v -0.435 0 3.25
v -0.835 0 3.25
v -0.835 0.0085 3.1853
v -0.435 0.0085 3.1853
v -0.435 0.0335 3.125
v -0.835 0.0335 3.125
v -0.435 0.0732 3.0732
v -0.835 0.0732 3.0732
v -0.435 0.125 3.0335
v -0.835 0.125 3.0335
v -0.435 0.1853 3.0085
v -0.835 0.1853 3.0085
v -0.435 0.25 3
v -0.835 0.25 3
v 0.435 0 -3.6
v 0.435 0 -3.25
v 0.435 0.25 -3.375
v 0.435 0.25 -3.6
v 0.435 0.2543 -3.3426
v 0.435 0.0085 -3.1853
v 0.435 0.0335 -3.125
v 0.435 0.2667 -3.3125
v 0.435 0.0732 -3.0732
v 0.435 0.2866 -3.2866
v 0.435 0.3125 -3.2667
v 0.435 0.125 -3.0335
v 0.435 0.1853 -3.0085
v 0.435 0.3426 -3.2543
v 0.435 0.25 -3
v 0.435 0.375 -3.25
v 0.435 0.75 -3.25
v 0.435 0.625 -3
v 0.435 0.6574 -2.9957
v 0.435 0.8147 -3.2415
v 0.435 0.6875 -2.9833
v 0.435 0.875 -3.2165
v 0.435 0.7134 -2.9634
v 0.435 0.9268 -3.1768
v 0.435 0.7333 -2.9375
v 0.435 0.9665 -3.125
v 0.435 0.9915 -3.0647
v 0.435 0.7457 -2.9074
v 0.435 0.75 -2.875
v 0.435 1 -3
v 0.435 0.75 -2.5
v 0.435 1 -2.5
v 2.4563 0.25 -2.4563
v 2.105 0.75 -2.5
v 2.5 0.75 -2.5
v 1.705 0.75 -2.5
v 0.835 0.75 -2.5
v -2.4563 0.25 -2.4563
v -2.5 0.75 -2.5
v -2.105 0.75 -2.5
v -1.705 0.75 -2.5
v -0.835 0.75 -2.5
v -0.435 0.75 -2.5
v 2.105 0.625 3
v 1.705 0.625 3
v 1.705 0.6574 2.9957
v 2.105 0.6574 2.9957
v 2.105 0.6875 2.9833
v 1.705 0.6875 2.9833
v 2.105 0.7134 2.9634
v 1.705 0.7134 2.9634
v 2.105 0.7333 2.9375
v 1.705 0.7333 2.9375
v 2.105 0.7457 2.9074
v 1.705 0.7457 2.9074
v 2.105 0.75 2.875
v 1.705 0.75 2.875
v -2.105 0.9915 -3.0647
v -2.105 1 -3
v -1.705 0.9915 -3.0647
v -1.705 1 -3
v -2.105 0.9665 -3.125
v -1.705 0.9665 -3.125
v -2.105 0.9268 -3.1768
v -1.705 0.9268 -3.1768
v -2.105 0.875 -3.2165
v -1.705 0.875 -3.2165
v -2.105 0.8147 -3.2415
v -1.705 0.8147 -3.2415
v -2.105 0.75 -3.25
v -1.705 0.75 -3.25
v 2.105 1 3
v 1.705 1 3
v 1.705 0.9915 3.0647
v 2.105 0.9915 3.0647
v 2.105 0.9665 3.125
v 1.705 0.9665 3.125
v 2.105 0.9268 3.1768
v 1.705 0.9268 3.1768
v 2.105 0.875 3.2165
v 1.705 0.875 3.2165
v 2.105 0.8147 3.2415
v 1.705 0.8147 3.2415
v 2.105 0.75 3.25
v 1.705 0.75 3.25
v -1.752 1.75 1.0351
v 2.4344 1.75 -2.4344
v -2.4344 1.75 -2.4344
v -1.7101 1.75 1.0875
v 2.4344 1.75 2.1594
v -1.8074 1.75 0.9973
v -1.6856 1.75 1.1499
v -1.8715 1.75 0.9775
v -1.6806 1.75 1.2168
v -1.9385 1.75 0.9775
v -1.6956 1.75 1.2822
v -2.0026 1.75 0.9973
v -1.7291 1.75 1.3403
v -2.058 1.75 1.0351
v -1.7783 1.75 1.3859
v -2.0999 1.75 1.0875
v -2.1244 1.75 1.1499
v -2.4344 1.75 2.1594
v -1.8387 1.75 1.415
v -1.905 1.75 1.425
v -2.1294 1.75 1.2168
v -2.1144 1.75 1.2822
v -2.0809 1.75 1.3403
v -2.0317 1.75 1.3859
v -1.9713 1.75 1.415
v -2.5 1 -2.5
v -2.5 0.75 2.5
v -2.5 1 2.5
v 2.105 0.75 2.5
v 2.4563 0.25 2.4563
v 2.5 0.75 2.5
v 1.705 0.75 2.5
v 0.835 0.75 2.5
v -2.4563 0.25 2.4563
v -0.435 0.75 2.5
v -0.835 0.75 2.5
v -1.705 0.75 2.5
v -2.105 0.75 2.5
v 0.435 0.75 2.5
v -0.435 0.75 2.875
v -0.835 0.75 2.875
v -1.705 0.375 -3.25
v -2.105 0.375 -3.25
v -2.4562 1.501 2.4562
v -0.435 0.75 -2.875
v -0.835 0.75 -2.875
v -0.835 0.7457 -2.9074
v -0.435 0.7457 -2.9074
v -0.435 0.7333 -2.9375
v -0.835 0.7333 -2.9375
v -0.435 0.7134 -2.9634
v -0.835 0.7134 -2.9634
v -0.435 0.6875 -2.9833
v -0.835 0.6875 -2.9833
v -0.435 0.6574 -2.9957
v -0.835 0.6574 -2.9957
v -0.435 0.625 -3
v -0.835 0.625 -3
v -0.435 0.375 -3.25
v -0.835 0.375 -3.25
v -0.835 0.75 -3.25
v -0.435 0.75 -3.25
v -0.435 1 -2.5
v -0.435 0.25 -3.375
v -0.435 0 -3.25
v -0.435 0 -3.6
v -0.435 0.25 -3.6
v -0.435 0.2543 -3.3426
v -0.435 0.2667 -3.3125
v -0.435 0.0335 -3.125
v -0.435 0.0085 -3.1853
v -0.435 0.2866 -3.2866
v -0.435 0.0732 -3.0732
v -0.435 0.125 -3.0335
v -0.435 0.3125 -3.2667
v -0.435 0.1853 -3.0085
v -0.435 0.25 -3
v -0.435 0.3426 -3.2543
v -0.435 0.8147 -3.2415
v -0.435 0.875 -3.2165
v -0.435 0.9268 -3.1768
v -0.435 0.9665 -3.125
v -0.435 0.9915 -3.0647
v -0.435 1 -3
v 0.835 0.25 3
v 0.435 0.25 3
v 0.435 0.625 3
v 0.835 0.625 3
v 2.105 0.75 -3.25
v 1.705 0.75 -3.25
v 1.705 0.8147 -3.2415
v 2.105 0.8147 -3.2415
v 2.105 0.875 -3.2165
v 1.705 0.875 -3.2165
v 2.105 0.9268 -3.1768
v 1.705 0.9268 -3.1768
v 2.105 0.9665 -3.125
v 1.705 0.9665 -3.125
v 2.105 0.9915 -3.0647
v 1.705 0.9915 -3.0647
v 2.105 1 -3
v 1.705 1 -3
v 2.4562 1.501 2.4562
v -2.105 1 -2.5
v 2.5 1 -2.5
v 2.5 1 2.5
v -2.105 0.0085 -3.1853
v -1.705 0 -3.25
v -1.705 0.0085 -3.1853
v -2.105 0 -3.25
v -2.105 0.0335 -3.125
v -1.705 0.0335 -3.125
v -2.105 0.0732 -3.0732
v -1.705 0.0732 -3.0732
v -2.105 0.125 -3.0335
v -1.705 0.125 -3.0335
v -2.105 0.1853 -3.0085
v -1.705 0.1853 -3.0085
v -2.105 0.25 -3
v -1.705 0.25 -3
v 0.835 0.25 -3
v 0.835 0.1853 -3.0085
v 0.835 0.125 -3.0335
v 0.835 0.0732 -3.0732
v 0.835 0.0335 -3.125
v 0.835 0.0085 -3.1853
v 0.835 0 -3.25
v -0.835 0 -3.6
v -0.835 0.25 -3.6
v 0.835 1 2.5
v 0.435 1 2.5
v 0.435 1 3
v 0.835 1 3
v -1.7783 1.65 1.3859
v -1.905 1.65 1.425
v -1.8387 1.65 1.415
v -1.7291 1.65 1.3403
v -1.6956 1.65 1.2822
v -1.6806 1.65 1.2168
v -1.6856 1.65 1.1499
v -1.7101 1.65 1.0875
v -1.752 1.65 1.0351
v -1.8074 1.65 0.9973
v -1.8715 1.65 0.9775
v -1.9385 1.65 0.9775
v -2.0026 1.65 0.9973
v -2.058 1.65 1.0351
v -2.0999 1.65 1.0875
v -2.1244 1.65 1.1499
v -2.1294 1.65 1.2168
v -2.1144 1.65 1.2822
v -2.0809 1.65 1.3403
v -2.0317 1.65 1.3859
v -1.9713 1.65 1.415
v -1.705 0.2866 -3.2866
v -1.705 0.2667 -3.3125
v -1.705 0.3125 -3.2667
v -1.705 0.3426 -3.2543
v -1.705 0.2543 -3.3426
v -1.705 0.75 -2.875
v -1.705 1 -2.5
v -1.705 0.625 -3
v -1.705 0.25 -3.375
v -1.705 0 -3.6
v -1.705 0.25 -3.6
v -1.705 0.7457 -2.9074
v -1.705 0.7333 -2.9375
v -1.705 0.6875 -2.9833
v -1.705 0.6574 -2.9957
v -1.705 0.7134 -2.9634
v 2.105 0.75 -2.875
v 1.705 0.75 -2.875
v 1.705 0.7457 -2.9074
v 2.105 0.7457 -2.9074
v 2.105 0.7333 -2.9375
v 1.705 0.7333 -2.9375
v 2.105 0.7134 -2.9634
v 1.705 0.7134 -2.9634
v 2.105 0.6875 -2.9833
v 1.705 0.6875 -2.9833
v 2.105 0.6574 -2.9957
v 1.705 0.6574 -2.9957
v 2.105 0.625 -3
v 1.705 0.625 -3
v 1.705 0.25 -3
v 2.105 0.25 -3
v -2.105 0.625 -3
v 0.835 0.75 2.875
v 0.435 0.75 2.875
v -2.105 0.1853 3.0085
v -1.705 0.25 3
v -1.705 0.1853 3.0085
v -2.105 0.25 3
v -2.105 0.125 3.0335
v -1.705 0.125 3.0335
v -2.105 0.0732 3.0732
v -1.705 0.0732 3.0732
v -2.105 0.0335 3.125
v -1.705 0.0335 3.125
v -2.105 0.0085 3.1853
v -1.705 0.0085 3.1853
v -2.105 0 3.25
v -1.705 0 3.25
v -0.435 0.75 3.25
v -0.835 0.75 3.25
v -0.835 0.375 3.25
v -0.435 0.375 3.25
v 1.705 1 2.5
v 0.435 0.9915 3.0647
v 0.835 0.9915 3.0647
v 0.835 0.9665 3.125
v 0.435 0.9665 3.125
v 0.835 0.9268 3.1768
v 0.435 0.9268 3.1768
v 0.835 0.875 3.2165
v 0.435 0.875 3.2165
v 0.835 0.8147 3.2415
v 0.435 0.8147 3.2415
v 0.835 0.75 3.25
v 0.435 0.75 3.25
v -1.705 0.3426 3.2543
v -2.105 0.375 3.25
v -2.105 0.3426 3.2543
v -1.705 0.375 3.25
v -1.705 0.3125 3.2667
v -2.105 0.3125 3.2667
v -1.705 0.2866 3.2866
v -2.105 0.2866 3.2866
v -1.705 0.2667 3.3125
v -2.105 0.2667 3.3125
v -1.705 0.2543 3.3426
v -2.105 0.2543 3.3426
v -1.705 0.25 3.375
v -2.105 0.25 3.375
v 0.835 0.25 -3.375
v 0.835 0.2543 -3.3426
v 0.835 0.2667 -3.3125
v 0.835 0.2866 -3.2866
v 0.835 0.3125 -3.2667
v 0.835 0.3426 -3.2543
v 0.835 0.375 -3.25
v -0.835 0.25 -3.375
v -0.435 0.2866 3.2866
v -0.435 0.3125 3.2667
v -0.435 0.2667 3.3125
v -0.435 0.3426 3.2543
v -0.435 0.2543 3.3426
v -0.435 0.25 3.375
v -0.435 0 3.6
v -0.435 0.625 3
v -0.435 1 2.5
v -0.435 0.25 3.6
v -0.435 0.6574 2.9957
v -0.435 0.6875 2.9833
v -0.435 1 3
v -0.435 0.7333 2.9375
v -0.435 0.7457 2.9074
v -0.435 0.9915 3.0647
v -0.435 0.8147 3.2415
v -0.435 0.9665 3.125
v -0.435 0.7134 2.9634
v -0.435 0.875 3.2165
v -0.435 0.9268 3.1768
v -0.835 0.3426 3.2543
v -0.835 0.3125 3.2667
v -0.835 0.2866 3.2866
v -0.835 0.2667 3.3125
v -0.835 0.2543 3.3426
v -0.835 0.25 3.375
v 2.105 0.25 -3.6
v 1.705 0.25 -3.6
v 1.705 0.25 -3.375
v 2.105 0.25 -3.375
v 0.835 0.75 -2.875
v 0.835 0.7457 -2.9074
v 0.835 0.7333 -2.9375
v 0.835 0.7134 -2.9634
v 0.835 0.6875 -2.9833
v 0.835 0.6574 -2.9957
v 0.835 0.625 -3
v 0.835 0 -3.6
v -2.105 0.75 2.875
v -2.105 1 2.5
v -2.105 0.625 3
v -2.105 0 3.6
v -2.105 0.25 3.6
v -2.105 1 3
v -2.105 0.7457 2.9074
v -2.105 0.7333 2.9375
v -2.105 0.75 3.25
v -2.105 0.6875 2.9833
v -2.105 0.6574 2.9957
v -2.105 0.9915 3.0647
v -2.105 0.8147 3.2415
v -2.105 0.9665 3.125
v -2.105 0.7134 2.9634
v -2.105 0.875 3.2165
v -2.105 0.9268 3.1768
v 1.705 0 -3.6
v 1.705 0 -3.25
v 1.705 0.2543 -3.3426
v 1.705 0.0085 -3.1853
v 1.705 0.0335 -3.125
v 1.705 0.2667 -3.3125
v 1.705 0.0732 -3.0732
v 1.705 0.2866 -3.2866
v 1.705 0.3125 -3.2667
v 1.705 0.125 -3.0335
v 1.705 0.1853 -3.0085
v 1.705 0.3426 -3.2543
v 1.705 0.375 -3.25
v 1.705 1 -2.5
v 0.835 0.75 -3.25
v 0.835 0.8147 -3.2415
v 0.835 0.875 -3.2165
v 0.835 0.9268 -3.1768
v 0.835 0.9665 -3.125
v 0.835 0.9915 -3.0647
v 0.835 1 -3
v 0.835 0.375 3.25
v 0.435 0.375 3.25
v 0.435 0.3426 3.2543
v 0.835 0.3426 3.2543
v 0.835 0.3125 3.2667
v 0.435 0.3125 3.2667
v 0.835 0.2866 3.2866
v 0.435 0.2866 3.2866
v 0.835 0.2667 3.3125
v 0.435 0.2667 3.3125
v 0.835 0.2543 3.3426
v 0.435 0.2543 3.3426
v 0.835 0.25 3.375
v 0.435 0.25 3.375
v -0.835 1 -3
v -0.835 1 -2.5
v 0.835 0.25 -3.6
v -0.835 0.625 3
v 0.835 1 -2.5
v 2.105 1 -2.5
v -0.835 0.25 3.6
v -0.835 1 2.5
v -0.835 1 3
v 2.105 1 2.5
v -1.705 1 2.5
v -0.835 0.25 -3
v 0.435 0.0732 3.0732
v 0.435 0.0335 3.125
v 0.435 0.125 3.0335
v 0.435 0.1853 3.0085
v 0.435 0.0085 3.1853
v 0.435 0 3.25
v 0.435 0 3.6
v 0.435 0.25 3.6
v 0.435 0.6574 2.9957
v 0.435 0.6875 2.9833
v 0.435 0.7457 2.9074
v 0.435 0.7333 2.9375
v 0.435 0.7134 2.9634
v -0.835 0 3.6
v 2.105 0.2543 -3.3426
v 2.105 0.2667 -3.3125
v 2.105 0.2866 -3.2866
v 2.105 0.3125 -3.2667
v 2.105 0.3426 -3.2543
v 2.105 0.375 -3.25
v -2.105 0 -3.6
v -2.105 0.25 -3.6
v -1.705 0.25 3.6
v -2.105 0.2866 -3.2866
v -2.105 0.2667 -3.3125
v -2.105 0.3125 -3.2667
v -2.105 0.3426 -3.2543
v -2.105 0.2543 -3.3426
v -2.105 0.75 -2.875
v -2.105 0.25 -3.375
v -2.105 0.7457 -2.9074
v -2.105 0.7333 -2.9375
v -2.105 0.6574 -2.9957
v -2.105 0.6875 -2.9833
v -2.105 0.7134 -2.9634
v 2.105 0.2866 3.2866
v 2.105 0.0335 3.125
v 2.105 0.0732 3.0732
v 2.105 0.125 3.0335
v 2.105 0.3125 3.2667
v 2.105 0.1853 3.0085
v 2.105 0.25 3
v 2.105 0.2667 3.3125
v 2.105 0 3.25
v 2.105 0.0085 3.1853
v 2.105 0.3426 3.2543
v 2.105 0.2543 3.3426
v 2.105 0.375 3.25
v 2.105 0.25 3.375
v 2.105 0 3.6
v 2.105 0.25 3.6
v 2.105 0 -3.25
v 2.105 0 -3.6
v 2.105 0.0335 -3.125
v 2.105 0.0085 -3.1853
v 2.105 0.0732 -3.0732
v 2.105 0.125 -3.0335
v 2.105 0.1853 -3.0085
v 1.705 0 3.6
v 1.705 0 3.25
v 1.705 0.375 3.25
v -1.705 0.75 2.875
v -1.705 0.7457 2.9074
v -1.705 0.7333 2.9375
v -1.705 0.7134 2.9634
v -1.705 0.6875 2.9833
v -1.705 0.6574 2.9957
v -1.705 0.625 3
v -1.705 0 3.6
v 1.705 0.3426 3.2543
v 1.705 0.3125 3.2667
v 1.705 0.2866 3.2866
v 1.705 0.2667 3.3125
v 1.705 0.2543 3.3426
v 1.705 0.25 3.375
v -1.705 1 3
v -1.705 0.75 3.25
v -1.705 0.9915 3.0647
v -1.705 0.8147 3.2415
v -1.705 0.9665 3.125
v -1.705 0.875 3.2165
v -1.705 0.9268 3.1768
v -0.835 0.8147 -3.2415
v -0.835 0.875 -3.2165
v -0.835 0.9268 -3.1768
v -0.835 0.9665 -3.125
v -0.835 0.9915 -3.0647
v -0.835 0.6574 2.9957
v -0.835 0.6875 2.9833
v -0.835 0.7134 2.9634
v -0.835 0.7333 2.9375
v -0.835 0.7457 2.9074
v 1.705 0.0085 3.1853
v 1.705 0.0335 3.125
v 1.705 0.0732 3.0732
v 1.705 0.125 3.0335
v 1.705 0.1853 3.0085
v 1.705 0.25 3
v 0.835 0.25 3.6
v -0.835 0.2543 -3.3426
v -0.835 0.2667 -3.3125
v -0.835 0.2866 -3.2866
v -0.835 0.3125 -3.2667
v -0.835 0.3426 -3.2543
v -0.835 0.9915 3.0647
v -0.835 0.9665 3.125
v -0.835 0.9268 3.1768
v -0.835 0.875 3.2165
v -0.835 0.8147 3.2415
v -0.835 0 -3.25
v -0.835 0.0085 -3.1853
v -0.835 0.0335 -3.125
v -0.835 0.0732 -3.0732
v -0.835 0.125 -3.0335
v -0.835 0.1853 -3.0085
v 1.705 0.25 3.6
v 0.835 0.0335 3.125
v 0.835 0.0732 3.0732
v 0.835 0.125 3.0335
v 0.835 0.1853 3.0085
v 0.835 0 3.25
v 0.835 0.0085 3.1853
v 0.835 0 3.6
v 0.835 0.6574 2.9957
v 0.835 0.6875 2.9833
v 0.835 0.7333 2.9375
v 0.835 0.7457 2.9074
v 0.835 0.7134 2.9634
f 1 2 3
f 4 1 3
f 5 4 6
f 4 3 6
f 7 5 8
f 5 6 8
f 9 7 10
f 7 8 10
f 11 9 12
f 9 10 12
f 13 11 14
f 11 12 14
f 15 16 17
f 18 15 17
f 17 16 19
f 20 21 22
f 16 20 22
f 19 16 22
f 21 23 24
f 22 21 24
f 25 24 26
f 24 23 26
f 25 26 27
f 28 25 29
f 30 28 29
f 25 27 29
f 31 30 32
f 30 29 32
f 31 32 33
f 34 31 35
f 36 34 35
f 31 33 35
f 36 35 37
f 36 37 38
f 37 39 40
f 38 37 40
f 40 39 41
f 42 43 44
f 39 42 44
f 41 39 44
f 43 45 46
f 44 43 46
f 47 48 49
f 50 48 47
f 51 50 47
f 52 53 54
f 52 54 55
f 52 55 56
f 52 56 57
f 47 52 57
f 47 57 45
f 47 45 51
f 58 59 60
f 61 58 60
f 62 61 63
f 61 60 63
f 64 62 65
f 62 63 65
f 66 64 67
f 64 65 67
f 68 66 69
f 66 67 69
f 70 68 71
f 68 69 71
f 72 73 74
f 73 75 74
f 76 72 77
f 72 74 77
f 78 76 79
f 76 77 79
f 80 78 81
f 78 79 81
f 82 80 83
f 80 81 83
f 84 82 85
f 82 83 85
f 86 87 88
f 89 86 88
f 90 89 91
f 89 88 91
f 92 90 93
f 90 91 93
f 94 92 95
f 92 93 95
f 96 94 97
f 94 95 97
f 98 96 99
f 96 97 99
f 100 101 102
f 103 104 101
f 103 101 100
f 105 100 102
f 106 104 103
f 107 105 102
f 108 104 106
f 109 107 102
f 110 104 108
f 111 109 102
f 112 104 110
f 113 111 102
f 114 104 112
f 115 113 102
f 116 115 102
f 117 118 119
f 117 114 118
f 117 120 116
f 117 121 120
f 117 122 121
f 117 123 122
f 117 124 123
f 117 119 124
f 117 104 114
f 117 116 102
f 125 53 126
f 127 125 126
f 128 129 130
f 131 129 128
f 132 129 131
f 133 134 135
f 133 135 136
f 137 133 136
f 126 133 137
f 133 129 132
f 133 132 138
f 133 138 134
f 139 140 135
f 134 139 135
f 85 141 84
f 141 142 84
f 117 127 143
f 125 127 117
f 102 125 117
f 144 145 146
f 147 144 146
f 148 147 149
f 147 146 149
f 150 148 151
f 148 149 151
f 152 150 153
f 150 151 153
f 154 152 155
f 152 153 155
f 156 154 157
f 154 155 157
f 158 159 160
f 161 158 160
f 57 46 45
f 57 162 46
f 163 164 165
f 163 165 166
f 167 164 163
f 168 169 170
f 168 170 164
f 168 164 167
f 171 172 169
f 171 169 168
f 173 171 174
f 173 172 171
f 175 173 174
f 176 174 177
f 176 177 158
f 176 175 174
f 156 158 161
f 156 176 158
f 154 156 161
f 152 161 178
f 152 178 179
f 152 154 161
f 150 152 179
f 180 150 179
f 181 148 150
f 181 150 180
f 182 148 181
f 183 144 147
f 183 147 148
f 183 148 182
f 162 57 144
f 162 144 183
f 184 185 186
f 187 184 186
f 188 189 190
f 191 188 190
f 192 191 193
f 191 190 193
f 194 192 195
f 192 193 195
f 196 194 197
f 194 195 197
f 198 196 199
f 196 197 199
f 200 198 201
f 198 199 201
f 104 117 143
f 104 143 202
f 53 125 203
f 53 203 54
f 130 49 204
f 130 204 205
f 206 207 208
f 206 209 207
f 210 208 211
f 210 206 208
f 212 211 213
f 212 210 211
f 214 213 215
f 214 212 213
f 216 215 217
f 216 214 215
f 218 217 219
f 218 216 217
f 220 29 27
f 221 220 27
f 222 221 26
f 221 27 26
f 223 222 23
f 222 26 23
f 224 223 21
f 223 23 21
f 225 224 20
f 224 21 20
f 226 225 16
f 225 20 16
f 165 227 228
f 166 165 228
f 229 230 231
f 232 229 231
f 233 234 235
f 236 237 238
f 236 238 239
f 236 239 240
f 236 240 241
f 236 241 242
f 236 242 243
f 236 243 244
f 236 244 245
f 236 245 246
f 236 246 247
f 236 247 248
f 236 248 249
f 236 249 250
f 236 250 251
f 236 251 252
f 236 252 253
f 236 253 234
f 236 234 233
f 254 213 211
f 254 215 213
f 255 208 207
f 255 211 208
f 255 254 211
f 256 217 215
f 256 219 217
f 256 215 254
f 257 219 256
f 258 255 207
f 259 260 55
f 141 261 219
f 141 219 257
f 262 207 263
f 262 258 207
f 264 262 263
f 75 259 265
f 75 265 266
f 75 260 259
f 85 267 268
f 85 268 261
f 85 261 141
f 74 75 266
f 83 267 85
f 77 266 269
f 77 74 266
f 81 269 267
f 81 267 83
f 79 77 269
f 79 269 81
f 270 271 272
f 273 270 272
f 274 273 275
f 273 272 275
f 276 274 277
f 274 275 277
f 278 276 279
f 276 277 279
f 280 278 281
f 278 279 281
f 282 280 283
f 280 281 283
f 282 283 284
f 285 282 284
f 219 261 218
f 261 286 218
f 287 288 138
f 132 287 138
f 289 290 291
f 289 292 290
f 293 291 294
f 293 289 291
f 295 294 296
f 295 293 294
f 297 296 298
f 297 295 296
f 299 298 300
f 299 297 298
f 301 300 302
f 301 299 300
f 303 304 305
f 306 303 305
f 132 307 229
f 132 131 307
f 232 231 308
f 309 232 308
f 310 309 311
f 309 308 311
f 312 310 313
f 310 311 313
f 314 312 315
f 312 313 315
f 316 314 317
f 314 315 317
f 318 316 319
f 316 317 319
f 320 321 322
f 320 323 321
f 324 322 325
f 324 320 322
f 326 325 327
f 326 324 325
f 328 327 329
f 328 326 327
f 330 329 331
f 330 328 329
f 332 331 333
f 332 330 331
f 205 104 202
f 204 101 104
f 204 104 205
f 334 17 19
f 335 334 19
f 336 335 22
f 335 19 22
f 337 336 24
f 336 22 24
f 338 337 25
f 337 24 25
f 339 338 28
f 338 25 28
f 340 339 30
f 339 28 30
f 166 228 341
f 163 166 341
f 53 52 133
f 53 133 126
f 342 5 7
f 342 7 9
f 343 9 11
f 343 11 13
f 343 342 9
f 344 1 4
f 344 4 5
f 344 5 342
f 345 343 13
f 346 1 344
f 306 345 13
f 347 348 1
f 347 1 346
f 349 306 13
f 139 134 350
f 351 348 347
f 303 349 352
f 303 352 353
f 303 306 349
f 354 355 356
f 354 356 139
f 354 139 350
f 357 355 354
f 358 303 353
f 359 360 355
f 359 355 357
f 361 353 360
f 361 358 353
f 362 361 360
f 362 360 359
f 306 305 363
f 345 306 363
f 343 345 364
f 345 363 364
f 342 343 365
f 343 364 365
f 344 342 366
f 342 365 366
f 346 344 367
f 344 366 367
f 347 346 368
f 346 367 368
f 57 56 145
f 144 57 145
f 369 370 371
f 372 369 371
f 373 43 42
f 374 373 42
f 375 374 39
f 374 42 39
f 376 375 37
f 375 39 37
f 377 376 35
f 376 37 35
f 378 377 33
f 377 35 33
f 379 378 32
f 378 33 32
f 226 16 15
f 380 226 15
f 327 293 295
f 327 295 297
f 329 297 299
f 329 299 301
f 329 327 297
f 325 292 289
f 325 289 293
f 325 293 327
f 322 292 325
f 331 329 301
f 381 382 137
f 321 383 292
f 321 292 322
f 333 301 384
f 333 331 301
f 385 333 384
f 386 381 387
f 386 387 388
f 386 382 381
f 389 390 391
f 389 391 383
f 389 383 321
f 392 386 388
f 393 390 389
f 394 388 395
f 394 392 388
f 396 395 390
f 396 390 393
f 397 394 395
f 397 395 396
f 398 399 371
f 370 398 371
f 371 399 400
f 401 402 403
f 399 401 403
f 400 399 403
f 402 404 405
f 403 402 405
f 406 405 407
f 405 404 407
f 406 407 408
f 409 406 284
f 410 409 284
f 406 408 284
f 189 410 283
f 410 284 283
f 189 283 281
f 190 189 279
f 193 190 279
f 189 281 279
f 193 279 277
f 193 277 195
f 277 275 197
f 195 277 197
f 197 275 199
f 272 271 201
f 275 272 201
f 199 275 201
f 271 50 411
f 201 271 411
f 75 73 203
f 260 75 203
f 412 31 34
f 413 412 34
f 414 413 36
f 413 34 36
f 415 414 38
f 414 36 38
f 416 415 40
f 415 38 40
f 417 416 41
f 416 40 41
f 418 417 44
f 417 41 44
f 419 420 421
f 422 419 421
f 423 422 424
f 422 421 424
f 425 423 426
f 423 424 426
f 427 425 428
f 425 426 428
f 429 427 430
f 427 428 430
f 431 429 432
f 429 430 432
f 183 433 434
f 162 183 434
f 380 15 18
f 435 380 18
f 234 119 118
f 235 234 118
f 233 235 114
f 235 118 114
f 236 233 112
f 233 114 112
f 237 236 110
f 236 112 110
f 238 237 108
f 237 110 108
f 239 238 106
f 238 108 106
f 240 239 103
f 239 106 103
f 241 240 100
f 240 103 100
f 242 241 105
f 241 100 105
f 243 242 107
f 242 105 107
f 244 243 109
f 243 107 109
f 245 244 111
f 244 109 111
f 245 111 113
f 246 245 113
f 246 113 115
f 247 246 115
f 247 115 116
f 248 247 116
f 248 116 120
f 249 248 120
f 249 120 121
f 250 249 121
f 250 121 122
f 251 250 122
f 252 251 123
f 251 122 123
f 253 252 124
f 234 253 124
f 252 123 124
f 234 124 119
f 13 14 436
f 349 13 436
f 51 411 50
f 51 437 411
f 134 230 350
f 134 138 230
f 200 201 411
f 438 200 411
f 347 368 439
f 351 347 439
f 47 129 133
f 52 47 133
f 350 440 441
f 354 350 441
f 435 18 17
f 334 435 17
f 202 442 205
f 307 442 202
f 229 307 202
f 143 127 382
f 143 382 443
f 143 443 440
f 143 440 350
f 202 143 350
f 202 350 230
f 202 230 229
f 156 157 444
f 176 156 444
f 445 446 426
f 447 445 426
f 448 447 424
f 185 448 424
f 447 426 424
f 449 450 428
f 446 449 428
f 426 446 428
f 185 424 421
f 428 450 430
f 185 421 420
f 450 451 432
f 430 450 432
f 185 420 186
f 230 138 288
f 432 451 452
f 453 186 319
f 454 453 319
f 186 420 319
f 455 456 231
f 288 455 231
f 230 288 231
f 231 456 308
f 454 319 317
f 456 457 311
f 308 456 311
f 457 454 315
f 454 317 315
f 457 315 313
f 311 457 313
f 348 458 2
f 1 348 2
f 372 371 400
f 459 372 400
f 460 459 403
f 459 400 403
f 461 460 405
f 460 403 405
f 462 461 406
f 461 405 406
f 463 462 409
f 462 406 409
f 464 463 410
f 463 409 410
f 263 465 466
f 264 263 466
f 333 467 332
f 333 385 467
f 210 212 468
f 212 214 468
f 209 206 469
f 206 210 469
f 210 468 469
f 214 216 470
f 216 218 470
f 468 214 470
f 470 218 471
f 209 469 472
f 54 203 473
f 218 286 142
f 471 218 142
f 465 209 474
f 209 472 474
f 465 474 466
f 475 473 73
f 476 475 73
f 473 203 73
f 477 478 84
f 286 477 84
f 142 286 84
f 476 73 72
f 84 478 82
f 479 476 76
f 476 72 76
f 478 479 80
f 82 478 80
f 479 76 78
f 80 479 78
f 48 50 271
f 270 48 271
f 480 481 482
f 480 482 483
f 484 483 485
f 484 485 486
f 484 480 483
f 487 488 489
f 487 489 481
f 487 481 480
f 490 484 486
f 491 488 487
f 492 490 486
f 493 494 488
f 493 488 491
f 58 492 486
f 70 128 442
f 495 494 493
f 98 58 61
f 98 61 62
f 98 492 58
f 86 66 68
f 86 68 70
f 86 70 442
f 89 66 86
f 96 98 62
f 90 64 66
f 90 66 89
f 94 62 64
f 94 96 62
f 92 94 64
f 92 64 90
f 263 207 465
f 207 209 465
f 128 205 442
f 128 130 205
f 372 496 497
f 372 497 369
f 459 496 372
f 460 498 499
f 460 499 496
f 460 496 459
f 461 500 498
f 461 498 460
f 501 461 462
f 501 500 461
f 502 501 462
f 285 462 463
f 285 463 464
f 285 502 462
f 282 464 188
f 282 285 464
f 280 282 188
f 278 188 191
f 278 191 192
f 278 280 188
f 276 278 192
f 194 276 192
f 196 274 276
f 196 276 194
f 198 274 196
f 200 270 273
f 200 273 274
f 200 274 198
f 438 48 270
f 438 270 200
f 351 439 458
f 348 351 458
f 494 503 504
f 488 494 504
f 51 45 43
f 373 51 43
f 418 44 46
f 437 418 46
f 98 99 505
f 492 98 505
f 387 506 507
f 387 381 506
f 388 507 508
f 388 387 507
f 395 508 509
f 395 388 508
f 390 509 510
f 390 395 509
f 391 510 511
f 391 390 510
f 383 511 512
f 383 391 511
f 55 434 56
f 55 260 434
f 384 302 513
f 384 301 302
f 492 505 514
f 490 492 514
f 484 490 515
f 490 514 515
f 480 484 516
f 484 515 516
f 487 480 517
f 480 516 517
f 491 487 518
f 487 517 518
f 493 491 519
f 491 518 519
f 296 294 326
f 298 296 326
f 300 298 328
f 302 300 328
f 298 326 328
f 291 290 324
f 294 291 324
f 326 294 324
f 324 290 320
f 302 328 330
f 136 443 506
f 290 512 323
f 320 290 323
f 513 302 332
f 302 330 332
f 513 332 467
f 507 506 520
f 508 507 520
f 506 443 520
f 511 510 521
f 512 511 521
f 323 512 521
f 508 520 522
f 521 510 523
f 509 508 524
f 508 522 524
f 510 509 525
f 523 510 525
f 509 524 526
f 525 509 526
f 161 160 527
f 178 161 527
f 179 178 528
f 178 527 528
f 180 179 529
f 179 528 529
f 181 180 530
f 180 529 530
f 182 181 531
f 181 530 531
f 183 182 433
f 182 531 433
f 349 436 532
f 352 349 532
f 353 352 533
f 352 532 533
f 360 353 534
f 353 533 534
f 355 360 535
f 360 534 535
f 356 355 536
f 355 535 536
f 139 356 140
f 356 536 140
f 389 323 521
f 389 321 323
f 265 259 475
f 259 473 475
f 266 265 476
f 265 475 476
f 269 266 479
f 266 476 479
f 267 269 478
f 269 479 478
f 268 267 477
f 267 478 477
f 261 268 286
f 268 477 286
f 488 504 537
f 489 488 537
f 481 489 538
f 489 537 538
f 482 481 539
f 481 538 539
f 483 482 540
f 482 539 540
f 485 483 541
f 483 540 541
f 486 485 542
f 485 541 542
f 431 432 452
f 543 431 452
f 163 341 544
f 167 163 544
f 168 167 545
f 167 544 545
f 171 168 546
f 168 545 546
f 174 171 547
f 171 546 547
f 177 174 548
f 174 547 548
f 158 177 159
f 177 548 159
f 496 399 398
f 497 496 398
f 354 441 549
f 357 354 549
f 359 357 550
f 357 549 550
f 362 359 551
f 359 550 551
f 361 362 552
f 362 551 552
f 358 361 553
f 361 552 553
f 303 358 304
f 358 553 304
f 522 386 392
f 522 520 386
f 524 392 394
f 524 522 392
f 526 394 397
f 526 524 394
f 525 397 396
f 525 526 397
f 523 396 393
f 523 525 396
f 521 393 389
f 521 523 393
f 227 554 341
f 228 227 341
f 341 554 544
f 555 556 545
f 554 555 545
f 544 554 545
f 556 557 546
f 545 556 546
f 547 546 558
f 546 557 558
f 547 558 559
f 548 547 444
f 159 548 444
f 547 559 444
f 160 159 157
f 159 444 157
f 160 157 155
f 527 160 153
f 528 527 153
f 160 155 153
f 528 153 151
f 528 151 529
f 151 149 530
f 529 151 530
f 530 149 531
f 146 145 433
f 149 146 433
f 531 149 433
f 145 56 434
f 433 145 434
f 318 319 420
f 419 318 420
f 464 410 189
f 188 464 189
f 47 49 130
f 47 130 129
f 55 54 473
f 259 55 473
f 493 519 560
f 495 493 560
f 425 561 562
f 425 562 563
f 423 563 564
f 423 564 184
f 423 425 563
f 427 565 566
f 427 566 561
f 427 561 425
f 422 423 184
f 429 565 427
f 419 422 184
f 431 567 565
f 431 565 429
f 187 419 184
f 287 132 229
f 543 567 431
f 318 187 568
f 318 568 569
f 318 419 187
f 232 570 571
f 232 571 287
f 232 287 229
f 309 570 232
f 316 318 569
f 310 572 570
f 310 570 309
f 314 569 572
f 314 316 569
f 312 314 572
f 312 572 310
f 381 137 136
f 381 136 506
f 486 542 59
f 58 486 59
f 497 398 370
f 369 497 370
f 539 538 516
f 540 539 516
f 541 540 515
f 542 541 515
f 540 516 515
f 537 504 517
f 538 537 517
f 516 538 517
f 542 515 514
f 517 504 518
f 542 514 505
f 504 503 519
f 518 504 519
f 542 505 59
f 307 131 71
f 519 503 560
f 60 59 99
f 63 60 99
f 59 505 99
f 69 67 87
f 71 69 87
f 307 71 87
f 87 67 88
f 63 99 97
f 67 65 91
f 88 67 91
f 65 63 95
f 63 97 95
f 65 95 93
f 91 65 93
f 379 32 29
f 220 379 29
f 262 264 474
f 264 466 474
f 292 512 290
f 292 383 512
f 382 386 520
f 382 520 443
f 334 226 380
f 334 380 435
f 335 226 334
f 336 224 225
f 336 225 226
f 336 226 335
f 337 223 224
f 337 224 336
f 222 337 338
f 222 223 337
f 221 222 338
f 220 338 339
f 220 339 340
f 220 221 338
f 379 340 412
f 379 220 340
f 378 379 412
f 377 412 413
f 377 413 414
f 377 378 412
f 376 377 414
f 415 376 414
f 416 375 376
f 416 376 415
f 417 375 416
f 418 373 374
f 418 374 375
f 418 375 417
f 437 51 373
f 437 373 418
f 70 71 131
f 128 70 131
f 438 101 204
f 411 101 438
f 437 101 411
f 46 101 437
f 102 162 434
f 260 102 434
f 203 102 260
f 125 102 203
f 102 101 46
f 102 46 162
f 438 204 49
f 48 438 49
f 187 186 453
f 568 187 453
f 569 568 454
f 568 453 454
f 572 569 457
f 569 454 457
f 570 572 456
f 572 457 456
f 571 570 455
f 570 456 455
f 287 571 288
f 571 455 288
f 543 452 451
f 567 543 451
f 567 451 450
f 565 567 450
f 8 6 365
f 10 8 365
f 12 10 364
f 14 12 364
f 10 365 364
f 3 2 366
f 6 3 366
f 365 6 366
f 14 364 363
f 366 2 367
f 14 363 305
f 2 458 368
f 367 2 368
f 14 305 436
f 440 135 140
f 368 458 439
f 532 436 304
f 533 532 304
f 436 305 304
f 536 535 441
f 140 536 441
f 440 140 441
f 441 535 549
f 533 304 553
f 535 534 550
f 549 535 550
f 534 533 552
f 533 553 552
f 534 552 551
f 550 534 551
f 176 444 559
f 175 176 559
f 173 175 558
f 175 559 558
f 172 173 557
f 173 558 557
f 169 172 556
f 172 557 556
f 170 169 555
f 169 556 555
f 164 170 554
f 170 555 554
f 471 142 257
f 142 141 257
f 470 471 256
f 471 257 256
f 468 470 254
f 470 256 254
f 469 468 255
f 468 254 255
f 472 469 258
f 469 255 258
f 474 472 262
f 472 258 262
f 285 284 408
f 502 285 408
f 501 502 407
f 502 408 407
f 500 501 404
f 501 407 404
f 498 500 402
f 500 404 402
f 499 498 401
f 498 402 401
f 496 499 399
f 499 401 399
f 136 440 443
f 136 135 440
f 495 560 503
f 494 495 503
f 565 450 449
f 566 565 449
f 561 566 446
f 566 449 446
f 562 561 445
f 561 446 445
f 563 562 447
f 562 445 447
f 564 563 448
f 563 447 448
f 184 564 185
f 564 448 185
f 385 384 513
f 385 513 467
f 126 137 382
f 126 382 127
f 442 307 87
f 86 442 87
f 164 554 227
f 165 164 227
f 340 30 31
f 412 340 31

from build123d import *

# Parameters (mm, degrees)
SKETCH2_W            = 5
SKETCH2_H            = 5
PACKAGE_DEPTH        = 1.5
DRAFT1_START         = -2.5
DRAFT1_DEPTH         = 5
DRAFT1_START_2       = -3
DRAFT1_2_DEPTH       = 6
DRAFT2_START         = -2.5
DRAFT2_DEPTH         = 5
DRAFT2_START_2       = -3
DRAFT2_2_DEPTH       = 6
CHAMFER1_SIZE        = 0.25
CHAMFER1_SIZE2       = 0.275015717
LEADS_DEPTH          = 0.2
FILLET1_R            = 0.25
FILLET2_R            = 0.125
FILLET1_OF_MIRROR1_R = 0.25
FILLET2_OF_MIRROR1_R = 0.125
LPATTERN1_START      = -0.835
LPATTERN1_DEPTH      = 0.4
LPATTERN1_START_2    = 0.435
LPATTERN1_2_DEPTH    = 0.4
LPATTERN1_START_3    = 1.705
LPATTERN1_3_DEPTH    = 0.4
SKETCH4_R            = 0.225
MARKER_DEPTH         = 0.1


with BuildPart() as part:
    # Sketch2 → Package (new body)
    with BuildSketch(Plane(origin=(0, 0.25, 0), x_dir=(-1, 0, 0), z_dir=(0, 1, 0))):
        Rectangle(SKETCH2_W, SKETCH2_H)
    extrude(amount=PACKAGE_DEPTH)

    # Draft1: read off the stored shape, not the designer's step
    # Draft1 outline → Draft1 (cut)
    with BuildSketch(Plane.YZ.offset(DRAFT1_START)):
        Polygon((1.75, -2.5), (1.75, -2.434383502), (1, -2.5), align=None)
        Polygon((1, 2.5), (1.75, 2.434383502), (1.75, 2.5), align=None)
    extrude(amount=DRAFT1_DEPTH, mode=Mode.SUBTRACT)

    # Draft1 2 outline → Draft1 2 (cut)
    with BuildSketch(Plane.XY.offset(DRAFT1_START_2)):
        Polygon((-2.5, 1), (-2.434383502, 1.75), (-2.5, 1.75), align=None)
        Polygon((2.434383502, 1.75), (2.5, 1), (2.5, 1.75), align=None)
    extrude(amount=DRAFT1_2_DEPTH, mode=Mode.SUBTRACT)

    # Draft2: read off the stored shape, not the designer's step
    # Draft2 outline → Draft2 (cut)
    with BuildSketch(Plane.XY.offset(DRAFT2_START)):
        Polygon((2.5, 0.75), (2.456255668, 0.25), (2.5, 0.25), align=None)
        Polygon((-2.456255668, 0.25), (-2.5, 0.75), (-2.5, 0.25), align=None)
    extrude(amount=DRAFT2_DEPTH, mode=Mode.SUBTRACT)

    # Draft2 2 outline → Draft2 2 (cut)
    with BuildSketch(Plane.YZ.offset(DRAFT2_START_2)):
        Polygon((0.75, -2.5), (0.25, -2.456255668), (0.25, -2.5), align=None)
        Polygon((0.25, 2.456255668), (0.75, 2.5), (0.25, 2.5), align=None)
    extrude(amount=DRAFT2_2_DEPTH, mode=Mode.SUBTRACT)

    # Chamfer1
    chamfer1_edges = [part.edges().sort_by_distance(p)[0] for p in [
        (0, 1.75, 2.434383502),
    ]]
    chamfer1_side = [part.faces().sort_by_distance(p)[0] for p in [
        (0, 1.373337774, 2.467337177),
    ]]
    chamfer(chamfer1_edges, length=CHAMFER1_SIZE, length2=CHAMFER1_SIZE2, reference=chamfer1_side[0])

    # Sketch3 → Leads (add, symmetric)
    with BuildSketch(Plane.ZY.offset(1.905)):
        Polygon((-2.5, 1), (-2.5, 0.75), (3, 0.75), (3, 0), (3.6, 0), (3.6, 0.25), (3.25, 0.25), (3.25, 1), align=None)
    leads = extrude(amount=LEADS_DEPTH, both=True)

    # Fillet1
    fillet1_edges = [part.edges().sort_by_distance(p)[0] for p in [
        (-1.905, 1, 3.25),
        (-1.905, 0, 3),
    ]]
    fillet(fillet1_edges, radius=FILLET1_R)

    # Fillet2
    fillet2_edges = [part.edges().sort_by_distance(p)[0] for p in [
        (-1.905, 0.75, 3),
        (-1.905, 0.25, 3.25),
    ]]
    fillet(fillet2_edges, radius=FILLET2_R)

    # Mirror1: Leads across plane
    add(leads.mirror(Plane.XY))

    # Fillet1 of Mirror1
    fillet1_of_mirror1_edges = [part.edges().sort_by_distance(p)[0] for p in [
        (-1.905, 1, -3.25),
        (-1.905, 0, -3),
    ]]
    fillet(fillet1_of_mirror1_edges, radius=FILLET1_OF_MIRROR1_R)

    # Fillet2 of Mirror1
    fillet2_of_mirror1_edges = [part.edges().sort_by_distance(p)[0] for p in [
        (-1.905, 0.75, -3),
        (-1.905, 0.25, -3.25),
    ]]
    fillet(fillet2_of_mirror1_edges, radius=FILLET2_OF_MIRROR1_R)

    # LPattern1: read off the stored shape, not the designer's step
    # LPattern1 outline → LPattern1 (add)
    with BuildSketch(Plane.YZ.offset(LPATTERN1_START)):
        with BuildLine():
            Line((1, 2.5), (1, 3))
            ThreePointArc((1, 3), (0.926776695, 3.176776695), (0.75, 3.25))
            Line((0.75, 3.25), (0.375, 3.25))
            ThreePointArc((0.375, 3.25), (0.286611652, 3.286611652), (0.25, 3.375))
            Line((0.25, 3.375), (0.25, 3.6))
            Line((0.25, 3.6), (0, 3.6))
            Line((0, 3.6), (0, 3.25))
            ThreePointArc((0, 3.25), (0.073223305, 3.073223305), (0.25, 3))
            Line((0.25, 3), (0.625, 3))
            ThreePointArc((0.625, 3), (0.713388348, 2.963388348), (0.75, 2.875))
            Line((0.75, 2.875), (0.75, 2.5))
            Line((0.75, 2.5), (1, 2.5))
        make_face()
        with BuildLine():
            ThreePointArc((0.75, -3.25), (0.926776695, -3.176776695), (1, -3))
            Line((1, -3), (1, -2.5))
            Line((1, -2.5), (0.75, -2.5))
            Line((0.75, -2.5), (0.75, -2.875))
            ThreePointArc((0.75, -2.875), (0.713388348, -2.963388348), (0.625, -3))
            Line((0.625, -3), (0.25, -3))
            ThreePointArc((0.25, -3), (0.073223305, -3.073223305), (0, -3.25))
            Line((0, -3.25), (0, -3.6))
            Line((0, -3.6), (0.25, -3.6))
            Line((0.25, -3.6), (0.25, -3.375))
            ThreePointArc((0.25, -3.375), (0.286611652, -3.286611652), (0.375, -3.25))
            Line((0.375, -3.25), (0.75, -3.25))
        make_face()
    extrude(amount=LPATTERN1_DEPTH)

    # LPattern1 2 outline → LPattern1 2 (add)
    with BuildSketch(Plane.YZ.offset(LPATTERN1_START_2)):
        with BuildLine():
            Line((1, 2.5), (1, 3))
            ThreePointArc((1, 3), (0.926776695, 3.176776695), (0.75, 3.25))
            Line((0.75, 3.25), (0.375, 3.25))
            ThreePointArc((0.375, 3.25), (0.286611652, 3.286611652), (0.25, 3.375))
            Line((0.25, 3.375), (0.25, 3.6))
            Line((0.25, 3.6), (0, 3.6))
            Line((0, 3.6), (0, 3.25))
            ThreePointArc((0, 3.25), (0.073223305, 3.073223305), (0.25, 3))
            Line((0.25, 3), (0.625, 3))
            ThreePointArc((0.625, 3), (0.713388348, 2.963388348), (0.75, 2.875))
            Line((0.75, 2.875), (0.75, 2.5))
            Line((0.75, 2.5), (1, 2.5))
        make_face()
        with BuildLine():
            ThreePointArc((0.75, -3.25), (0.926776695, -3.176776695), (1, -3))
            Line((1, -3), (1, -2.5))
            Line((1, -2.5), (0.75, -2.5))
            Line((0.75, -2.5), (0.75, -2.875))
            ThreePointArc((0.75, -2.875), (0.713388348, -2.963388348), (0.625, -3))
            Line((0.625, -3), (0.25, -3))
            ThreePointArc((0.25, -3), (0.073223305, -3.073223305), (0, -3.25))
            Line((0, -3.25), (0, -3.6))
            Line((0, -3.6), (0.25, -3.6))
            Line((0.25, -3.6), (0.25, -3.375))
            ThreePointArc((0.25, -3.375), (0.286611652, -3.286611652), (0.375, -3.25))
            Line((0.375, -3.25), (0.75, -3.25))
        make_face()
    extrude(amount=LPATTERN1_2_DEPTH)

    # LPattern1 3 outline → LPattern1 3 (add)
    with BuildSketch(Plane.YZ.offset(LPATTERN1_START_3)):
        with BuildLine():
            Line((1, 2.5), (1, 3))
            ThreePointArc((1, 3), (0.926776695, 3.176776695), (0.75, 3.25))
            Line((0.75, 3.25), (0.375, 3.25))
            ThreePointArc((0.375, 3.25), (0.286611652, 3.286611652), (0.25, 3.375))
            Line((0.25, 3.375), (0.25, 3.6))
            Line((0.25, 3.6), (0, 3.6))
            Line((0, 3.6), (0, 3.25))
            ThreePointArc((0, 3.25), (0.073223305, 3.073223305), (0.25, 3))
            Line((0.25, 3), (0.625, 3))
            ThreePointArc((0.625, 3), (0.713388348, 2.963388348), (0.75, 2.875))
            Line((0.75, 2.875), (0.75, 2.5))
            Line((0.75, 2.5), (1, 2.5))
        make_face()
        with BuildLine():
            ThreePointArc((0.75, -3.25), (0.926776695, -3.176776695), (1, -3))
            Line((1, -3), (1, -2.5))
            Line((1, -2.5), (0.75, -2.5))
            Line((0.75, -2.5), (0.75, -2.875))
            ThreePointArc((0.75, -2.875), (0.713388348, -2.963388348), (0.625, -3))
            Line((0.625, -3), (0.25, -3))
            ThreePointArc((0.25, -3), (0.073223305, -3.073223305), (0, -3.25))
            Line((0, -3.25), (0, -3.6))
            Line((0, -3.6), (0.25, -3.6))
            Line((0.25, -3.6), (0.25, -3.375))
            ThreePointArc((0.25, -3.375), (0.286611652, -3.286611652), (0.375, -3.25))
            Line((0.375, -3.25), (0.75, -3.25))
        make_face()
    extrude(amount=LPATTERN1_3_DEPTH)

    # Sketch4 → Marker (cut)
    with BuildSketch(Plane(origin=(0, 1.75, 0), x_dir=(1, 0, 0), z_dir=(0, 1, 0))):
        with Locations(Location((-1.905, -1.2, 0), (0, 0, 270))):
            Circle(SKETCH4_R)
    extrude(amount=-MARKER_DEPTH, mode=Mode.SUBTRACT)


solid = part.part
